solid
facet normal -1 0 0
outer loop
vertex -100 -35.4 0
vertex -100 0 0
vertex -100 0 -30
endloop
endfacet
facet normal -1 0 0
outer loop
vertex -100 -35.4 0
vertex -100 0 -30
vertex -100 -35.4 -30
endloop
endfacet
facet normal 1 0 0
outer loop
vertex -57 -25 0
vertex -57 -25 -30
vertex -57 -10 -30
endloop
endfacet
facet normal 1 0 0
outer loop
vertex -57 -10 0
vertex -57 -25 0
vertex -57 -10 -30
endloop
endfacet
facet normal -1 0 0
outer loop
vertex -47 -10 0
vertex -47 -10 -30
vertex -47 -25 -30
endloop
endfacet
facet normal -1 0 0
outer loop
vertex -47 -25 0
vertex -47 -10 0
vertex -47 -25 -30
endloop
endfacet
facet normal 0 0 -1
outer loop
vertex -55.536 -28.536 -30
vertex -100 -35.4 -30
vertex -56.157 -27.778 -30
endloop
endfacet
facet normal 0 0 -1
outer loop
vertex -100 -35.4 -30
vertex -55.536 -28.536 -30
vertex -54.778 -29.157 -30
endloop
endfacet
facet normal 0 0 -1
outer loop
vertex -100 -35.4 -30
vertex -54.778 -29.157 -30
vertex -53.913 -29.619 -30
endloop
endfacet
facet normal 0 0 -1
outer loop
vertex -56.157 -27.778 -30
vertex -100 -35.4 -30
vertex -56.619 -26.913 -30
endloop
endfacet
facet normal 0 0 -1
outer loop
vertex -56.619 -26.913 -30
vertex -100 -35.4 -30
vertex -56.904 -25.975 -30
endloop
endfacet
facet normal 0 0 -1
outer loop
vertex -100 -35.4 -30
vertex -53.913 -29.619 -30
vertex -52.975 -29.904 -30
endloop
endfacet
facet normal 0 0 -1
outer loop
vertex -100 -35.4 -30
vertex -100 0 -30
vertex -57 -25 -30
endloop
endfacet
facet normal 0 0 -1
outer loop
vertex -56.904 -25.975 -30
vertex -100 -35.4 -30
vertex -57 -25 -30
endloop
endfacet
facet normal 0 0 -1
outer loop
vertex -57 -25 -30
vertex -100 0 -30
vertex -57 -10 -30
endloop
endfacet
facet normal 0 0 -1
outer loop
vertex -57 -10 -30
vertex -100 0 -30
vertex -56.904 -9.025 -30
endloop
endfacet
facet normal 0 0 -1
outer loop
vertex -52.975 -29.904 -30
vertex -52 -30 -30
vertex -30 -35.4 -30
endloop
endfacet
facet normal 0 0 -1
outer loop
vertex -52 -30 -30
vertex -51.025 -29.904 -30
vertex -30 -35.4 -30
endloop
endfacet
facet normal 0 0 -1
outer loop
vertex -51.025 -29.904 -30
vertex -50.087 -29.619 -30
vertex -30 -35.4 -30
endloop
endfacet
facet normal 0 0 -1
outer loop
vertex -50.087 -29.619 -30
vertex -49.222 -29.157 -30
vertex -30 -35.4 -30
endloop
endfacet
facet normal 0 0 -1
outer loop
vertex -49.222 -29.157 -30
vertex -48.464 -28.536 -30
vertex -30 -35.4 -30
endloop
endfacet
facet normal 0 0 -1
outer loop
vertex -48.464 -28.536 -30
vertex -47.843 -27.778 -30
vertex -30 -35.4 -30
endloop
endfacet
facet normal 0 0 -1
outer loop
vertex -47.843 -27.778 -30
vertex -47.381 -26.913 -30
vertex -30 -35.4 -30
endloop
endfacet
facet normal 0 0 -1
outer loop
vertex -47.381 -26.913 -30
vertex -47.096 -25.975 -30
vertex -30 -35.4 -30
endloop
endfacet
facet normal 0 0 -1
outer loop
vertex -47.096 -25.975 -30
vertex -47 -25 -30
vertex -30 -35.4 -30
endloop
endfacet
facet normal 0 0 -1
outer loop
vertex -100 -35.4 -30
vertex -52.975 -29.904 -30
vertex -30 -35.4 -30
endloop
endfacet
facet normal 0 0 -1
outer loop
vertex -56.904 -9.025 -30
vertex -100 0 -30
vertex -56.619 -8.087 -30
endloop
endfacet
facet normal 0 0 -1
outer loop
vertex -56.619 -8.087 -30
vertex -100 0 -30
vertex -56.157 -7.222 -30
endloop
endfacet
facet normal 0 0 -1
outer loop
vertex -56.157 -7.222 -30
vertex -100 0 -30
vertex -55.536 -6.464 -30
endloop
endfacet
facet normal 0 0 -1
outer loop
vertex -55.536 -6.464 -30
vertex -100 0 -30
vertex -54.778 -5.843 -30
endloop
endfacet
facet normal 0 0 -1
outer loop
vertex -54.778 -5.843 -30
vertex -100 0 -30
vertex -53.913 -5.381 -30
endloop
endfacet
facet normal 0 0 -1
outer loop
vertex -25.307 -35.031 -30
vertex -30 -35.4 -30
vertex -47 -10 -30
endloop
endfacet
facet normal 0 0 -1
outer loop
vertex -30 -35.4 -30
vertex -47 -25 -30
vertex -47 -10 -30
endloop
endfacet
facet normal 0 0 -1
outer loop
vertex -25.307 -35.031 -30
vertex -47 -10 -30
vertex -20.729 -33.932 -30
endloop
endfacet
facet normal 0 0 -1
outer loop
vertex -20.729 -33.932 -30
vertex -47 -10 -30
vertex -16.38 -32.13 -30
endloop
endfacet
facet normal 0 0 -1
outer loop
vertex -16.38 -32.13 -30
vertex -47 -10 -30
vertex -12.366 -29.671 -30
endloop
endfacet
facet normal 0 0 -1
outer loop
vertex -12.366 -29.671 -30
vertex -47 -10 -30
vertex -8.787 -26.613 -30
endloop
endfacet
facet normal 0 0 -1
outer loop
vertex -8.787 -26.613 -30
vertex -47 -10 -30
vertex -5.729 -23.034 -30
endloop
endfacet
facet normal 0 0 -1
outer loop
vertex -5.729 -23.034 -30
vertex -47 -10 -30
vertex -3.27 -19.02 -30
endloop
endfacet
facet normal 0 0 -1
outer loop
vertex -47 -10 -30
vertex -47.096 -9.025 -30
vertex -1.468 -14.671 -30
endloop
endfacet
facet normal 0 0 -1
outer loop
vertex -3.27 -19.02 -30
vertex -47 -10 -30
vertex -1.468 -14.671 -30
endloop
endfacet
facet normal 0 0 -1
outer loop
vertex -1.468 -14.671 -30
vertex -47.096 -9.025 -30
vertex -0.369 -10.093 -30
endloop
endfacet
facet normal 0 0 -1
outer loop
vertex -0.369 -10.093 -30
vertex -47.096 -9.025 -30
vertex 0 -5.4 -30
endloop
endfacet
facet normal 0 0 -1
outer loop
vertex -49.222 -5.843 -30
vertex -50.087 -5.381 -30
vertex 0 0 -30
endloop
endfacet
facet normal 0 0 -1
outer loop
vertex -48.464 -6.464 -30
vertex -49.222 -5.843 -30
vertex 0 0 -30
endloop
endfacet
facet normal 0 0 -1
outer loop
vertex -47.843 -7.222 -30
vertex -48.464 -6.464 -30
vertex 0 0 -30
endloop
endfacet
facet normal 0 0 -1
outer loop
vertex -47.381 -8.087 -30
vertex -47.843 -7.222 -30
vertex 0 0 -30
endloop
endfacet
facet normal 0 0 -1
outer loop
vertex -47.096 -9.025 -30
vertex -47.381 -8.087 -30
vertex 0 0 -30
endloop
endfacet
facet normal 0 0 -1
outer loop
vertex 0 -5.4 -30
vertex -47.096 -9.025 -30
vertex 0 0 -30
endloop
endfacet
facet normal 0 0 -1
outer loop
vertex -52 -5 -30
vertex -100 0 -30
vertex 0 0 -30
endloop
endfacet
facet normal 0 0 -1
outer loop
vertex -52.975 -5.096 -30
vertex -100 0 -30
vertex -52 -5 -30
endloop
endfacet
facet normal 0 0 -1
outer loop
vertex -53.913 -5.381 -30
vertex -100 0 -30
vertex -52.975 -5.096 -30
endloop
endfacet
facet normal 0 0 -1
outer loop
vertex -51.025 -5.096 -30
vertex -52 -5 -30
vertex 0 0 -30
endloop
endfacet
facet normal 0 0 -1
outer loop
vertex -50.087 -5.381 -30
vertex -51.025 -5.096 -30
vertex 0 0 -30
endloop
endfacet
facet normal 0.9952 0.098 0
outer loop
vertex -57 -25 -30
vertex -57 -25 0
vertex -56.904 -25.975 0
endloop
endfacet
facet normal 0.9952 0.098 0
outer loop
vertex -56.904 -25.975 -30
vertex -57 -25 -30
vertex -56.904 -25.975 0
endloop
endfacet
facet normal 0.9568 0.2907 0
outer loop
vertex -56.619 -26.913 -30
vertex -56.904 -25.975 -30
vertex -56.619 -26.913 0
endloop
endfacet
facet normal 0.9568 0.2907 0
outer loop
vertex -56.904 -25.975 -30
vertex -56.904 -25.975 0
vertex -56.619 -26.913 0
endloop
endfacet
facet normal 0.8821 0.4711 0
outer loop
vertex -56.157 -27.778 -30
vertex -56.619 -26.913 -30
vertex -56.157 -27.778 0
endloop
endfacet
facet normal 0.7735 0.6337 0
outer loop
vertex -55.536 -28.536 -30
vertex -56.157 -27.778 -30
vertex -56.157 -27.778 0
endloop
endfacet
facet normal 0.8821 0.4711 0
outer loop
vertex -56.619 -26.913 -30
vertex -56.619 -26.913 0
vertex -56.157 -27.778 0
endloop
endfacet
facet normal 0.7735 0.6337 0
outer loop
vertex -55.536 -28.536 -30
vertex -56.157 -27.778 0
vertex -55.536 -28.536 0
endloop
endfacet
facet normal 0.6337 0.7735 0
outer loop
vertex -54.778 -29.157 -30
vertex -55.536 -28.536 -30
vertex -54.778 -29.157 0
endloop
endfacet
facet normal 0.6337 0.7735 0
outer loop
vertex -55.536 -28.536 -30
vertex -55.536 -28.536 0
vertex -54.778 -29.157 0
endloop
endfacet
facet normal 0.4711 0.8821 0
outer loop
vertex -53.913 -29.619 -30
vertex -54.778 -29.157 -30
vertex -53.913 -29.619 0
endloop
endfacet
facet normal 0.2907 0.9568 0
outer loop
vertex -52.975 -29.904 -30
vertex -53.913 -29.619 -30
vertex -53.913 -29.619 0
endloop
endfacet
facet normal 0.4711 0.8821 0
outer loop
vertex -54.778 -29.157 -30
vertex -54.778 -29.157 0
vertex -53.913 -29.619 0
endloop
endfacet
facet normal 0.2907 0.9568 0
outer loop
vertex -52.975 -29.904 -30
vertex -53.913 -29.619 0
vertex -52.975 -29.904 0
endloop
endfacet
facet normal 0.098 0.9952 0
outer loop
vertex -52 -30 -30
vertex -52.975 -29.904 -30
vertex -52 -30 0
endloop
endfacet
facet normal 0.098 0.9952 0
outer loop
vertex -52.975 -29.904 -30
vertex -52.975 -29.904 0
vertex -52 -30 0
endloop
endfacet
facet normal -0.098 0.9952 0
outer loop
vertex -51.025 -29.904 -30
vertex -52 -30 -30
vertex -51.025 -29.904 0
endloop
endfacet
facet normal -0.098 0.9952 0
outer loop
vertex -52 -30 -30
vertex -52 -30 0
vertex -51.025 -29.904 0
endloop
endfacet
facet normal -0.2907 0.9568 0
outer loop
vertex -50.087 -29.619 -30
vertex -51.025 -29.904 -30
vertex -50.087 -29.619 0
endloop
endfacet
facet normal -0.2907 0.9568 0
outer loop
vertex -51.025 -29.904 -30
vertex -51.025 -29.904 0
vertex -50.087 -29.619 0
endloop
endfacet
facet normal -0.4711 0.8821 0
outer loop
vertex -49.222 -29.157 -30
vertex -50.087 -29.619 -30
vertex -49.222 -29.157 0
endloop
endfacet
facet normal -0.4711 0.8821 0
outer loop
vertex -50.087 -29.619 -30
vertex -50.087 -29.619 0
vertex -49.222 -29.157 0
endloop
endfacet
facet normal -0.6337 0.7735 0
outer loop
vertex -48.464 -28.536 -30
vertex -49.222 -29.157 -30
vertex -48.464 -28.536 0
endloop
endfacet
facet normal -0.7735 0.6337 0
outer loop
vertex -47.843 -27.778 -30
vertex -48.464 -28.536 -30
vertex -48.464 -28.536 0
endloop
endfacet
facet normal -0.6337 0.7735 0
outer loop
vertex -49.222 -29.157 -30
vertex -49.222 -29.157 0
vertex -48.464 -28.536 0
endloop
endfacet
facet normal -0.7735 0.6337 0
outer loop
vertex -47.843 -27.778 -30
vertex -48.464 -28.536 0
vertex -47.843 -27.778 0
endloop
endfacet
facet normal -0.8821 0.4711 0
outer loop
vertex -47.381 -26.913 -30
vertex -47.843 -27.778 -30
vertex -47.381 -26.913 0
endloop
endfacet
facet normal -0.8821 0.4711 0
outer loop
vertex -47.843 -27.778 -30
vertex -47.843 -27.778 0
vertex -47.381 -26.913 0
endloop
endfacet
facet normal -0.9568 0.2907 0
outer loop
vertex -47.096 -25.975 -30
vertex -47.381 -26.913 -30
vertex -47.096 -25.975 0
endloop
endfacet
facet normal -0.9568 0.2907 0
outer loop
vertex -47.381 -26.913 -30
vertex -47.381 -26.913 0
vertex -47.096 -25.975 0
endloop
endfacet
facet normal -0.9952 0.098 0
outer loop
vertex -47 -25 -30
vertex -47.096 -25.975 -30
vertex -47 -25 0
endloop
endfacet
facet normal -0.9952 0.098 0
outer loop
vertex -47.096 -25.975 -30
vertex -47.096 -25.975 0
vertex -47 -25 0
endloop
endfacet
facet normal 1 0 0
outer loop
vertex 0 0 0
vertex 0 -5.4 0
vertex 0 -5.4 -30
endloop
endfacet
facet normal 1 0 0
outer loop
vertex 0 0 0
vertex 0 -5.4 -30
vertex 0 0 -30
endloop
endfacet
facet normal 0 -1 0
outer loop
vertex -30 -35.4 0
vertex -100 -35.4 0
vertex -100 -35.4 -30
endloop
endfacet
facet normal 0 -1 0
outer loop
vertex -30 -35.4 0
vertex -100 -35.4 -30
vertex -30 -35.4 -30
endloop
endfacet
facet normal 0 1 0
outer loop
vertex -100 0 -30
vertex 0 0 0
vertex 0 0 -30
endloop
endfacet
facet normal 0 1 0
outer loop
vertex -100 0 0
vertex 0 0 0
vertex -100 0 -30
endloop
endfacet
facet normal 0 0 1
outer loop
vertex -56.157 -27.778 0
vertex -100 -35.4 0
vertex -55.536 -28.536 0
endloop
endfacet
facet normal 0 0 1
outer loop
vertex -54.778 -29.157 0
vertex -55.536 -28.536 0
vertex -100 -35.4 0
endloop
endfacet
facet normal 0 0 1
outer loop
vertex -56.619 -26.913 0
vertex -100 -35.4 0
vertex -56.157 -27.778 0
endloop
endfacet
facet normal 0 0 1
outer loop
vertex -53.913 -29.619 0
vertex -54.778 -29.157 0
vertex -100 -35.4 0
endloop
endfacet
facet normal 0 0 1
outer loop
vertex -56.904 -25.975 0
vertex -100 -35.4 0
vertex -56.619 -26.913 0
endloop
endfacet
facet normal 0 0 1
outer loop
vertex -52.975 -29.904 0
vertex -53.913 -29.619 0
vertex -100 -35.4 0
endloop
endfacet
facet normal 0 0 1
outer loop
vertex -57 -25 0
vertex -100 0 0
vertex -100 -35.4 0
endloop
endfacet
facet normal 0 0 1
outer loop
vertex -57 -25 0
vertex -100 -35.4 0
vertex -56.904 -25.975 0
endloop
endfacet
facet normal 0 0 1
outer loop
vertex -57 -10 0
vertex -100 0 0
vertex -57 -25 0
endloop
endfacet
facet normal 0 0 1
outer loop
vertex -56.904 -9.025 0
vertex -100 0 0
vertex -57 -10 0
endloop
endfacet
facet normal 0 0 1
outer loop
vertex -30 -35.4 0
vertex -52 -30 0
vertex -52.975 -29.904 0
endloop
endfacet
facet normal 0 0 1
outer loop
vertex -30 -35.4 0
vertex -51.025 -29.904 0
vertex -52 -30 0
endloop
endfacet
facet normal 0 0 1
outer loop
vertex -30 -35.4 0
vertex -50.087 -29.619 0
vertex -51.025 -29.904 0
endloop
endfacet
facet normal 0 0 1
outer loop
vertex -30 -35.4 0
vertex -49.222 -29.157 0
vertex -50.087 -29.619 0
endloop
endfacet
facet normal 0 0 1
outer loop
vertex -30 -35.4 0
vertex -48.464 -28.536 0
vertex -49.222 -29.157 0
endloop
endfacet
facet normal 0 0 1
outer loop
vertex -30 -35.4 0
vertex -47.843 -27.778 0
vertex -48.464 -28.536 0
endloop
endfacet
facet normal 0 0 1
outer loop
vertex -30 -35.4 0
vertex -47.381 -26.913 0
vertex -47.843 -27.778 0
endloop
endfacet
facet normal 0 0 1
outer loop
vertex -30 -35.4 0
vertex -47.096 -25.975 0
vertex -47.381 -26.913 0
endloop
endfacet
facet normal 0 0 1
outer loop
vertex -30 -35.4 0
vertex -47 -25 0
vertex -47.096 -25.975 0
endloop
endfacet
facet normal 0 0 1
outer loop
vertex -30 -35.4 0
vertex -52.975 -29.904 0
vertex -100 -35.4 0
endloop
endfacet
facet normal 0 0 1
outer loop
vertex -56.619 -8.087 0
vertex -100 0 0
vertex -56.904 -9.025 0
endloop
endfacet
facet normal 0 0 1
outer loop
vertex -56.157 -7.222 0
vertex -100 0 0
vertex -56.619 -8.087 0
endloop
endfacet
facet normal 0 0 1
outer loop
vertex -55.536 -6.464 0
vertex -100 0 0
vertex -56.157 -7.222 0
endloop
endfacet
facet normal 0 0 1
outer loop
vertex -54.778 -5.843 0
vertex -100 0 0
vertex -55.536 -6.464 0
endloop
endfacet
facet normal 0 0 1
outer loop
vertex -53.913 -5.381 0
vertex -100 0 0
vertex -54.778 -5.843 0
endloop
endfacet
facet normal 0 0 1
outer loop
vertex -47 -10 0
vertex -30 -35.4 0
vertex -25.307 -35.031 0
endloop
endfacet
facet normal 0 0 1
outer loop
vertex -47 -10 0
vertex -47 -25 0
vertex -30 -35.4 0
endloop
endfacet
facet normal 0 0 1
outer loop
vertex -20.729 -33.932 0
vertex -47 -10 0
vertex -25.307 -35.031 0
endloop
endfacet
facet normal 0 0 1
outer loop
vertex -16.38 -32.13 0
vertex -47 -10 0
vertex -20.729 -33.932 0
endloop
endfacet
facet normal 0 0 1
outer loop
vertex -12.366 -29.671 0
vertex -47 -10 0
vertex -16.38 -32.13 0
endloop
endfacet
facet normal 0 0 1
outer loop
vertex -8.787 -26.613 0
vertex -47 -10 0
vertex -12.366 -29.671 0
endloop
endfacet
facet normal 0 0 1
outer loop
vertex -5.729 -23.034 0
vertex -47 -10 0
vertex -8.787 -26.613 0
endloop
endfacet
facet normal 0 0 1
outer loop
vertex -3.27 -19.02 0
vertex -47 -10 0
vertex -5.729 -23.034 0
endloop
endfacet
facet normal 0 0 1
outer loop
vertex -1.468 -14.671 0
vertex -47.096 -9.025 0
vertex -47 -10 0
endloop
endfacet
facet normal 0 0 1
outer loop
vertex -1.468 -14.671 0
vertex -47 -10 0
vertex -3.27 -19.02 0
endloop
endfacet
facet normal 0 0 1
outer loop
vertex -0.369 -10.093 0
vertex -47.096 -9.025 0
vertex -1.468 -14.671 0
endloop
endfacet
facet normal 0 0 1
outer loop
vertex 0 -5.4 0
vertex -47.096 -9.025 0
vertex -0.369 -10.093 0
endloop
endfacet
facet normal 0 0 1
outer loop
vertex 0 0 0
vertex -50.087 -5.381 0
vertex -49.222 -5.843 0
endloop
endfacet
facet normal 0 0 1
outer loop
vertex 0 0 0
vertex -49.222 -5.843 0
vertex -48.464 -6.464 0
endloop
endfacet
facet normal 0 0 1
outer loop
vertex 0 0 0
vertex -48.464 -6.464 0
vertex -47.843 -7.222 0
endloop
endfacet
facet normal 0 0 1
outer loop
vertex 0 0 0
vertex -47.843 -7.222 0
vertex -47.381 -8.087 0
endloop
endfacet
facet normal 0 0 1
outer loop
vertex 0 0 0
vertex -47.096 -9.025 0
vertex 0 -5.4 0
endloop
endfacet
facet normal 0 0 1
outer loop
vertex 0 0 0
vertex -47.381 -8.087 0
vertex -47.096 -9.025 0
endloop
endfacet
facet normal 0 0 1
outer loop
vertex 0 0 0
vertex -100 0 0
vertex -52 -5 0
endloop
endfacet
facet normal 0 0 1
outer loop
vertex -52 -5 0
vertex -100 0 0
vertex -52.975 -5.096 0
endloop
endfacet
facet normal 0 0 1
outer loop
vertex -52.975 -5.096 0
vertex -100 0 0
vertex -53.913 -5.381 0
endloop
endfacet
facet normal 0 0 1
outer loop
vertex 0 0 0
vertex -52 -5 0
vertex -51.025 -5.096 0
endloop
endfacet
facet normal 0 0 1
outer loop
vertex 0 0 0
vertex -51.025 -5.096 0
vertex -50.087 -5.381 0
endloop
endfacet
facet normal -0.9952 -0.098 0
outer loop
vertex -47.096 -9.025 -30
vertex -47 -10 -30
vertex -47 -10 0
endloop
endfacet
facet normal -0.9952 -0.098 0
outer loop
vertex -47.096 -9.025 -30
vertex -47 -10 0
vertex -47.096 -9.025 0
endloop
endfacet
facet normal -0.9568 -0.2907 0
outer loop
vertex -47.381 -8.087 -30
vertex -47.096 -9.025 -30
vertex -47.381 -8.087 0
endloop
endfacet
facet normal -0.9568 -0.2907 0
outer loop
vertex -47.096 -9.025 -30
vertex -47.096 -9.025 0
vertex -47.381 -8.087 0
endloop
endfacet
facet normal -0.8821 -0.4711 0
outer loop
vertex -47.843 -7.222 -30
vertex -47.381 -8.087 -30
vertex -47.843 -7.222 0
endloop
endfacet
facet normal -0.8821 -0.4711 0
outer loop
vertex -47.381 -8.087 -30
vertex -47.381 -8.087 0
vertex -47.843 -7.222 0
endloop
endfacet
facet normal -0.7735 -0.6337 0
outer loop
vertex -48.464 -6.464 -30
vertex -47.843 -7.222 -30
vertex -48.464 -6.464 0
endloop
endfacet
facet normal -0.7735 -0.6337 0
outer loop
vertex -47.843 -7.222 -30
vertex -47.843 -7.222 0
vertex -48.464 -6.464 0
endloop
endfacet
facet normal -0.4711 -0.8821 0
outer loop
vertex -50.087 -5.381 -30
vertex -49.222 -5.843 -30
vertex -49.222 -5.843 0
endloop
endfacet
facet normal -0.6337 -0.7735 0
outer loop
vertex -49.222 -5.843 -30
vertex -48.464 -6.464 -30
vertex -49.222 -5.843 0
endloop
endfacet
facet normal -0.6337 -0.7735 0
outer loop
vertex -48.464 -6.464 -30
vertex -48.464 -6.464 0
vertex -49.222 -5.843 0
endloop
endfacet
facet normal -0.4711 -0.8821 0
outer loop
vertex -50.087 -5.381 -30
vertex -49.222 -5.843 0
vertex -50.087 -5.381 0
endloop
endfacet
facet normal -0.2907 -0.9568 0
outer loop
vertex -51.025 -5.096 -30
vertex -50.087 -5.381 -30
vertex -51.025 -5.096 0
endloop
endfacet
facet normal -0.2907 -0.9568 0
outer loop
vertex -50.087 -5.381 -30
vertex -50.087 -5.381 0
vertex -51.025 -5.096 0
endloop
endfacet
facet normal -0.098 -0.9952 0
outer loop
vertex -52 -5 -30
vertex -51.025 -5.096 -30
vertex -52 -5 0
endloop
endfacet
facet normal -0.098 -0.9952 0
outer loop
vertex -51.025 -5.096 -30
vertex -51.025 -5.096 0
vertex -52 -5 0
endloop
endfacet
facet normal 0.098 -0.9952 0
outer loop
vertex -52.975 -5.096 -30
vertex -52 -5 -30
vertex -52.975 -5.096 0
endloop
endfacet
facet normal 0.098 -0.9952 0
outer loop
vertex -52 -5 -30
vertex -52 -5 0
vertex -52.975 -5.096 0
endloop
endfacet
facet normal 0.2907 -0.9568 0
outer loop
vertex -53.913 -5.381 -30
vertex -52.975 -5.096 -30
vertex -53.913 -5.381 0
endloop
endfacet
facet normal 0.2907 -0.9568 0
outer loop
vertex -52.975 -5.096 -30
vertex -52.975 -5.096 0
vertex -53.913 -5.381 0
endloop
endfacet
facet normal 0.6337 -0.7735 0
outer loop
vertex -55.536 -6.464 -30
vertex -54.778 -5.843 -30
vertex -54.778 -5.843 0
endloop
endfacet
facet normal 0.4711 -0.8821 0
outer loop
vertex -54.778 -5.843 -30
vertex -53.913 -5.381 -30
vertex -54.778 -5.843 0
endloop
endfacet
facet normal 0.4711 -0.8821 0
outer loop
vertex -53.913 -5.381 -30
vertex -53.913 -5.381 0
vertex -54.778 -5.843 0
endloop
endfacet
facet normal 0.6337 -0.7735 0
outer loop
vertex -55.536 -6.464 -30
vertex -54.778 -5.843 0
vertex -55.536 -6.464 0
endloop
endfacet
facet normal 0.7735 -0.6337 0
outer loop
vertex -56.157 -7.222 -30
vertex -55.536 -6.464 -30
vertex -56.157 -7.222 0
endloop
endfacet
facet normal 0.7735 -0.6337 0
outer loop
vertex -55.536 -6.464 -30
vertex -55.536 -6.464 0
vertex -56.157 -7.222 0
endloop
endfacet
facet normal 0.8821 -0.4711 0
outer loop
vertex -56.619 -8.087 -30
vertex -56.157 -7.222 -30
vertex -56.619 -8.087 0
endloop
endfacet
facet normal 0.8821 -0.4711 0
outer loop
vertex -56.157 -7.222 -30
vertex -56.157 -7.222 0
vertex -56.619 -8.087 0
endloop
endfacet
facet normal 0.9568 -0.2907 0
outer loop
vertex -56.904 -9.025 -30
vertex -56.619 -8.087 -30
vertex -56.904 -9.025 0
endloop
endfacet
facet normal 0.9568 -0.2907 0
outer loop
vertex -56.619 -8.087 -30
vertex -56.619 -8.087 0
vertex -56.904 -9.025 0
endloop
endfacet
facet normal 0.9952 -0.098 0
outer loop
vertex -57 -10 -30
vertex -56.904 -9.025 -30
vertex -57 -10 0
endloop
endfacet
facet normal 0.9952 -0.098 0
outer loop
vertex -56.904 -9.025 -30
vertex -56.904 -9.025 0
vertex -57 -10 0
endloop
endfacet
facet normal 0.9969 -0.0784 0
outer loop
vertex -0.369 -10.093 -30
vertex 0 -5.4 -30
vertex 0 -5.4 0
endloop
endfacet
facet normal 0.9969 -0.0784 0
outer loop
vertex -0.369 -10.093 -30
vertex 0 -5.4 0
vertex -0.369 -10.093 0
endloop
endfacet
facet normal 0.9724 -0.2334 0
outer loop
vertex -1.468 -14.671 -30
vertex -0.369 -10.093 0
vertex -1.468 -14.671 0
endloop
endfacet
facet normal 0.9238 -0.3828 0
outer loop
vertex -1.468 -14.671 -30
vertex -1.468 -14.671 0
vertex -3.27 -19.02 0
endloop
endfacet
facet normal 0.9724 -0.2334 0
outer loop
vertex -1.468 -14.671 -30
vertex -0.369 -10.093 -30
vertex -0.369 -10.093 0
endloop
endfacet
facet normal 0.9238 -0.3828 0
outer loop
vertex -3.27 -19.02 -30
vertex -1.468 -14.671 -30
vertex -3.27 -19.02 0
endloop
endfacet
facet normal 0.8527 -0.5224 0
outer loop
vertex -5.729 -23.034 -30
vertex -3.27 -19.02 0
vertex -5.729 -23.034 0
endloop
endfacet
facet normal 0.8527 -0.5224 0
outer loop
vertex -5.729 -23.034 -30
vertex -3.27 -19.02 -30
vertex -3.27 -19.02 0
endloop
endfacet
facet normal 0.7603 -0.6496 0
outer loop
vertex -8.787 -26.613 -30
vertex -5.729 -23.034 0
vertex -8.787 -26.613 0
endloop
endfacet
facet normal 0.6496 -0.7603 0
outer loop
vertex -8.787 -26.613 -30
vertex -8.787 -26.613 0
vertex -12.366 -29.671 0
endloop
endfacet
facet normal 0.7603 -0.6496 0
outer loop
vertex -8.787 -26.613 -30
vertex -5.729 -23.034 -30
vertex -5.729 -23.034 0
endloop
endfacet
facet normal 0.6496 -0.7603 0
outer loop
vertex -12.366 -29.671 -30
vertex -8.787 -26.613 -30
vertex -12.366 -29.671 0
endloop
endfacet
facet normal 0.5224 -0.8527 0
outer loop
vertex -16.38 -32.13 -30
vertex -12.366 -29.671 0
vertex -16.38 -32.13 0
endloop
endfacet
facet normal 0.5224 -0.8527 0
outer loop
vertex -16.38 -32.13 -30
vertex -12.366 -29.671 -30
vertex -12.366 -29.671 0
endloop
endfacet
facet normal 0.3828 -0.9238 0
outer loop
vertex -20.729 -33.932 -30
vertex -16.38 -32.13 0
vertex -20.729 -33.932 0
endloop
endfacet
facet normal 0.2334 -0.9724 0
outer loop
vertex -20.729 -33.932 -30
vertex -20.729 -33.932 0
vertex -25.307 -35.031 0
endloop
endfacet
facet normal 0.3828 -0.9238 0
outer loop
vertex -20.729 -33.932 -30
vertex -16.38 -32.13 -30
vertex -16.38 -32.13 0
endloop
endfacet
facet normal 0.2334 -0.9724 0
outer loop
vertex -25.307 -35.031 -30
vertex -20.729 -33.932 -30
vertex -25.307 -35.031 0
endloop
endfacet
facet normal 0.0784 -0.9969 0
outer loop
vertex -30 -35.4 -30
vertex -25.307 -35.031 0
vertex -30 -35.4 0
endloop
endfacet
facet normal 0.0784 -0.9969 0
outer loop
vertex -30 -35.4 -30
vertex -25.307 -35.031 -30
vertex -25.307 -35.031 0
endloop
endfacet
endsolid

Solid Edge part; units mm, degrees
sketch "Sketch1" plane through (0, 0, 0) normal (0, 0, 1) x (1, 0, 0)
  line L0 (0, 0) -> (-100, 0)
  line L1 (-100, 0) -> (-100, -35.4)
  line L2 (-100, -35.4) -> (0, -35.4)
  line L3 (0, -35.4) -> (0, 0)
extrude "Protrusion1" add sketch "Sketch1" against normal blind 30
sketch "Sketch2" plane through (-50, -17.7, 0) normal (0, 0, 1) x (1, 0, 0)
  line L0 (3, 7.7) -> (3, -7.3)
  arc A0 (-7, -7.3) -> (3, -7.3) centre (-2, -7.3) ccw
  line L1 (-7, -7.3) -> (-7, 7.7)
  arc A1 (-7, 7.7) -> (3, 7.7) centre (-2, 7.7) cw
extrude "ExtrudedCutout_1" cut sketch "Sketch2" against normal blind 30
fillet "Round_1" radius 30 1 edges at (0, -35.4, -15)
